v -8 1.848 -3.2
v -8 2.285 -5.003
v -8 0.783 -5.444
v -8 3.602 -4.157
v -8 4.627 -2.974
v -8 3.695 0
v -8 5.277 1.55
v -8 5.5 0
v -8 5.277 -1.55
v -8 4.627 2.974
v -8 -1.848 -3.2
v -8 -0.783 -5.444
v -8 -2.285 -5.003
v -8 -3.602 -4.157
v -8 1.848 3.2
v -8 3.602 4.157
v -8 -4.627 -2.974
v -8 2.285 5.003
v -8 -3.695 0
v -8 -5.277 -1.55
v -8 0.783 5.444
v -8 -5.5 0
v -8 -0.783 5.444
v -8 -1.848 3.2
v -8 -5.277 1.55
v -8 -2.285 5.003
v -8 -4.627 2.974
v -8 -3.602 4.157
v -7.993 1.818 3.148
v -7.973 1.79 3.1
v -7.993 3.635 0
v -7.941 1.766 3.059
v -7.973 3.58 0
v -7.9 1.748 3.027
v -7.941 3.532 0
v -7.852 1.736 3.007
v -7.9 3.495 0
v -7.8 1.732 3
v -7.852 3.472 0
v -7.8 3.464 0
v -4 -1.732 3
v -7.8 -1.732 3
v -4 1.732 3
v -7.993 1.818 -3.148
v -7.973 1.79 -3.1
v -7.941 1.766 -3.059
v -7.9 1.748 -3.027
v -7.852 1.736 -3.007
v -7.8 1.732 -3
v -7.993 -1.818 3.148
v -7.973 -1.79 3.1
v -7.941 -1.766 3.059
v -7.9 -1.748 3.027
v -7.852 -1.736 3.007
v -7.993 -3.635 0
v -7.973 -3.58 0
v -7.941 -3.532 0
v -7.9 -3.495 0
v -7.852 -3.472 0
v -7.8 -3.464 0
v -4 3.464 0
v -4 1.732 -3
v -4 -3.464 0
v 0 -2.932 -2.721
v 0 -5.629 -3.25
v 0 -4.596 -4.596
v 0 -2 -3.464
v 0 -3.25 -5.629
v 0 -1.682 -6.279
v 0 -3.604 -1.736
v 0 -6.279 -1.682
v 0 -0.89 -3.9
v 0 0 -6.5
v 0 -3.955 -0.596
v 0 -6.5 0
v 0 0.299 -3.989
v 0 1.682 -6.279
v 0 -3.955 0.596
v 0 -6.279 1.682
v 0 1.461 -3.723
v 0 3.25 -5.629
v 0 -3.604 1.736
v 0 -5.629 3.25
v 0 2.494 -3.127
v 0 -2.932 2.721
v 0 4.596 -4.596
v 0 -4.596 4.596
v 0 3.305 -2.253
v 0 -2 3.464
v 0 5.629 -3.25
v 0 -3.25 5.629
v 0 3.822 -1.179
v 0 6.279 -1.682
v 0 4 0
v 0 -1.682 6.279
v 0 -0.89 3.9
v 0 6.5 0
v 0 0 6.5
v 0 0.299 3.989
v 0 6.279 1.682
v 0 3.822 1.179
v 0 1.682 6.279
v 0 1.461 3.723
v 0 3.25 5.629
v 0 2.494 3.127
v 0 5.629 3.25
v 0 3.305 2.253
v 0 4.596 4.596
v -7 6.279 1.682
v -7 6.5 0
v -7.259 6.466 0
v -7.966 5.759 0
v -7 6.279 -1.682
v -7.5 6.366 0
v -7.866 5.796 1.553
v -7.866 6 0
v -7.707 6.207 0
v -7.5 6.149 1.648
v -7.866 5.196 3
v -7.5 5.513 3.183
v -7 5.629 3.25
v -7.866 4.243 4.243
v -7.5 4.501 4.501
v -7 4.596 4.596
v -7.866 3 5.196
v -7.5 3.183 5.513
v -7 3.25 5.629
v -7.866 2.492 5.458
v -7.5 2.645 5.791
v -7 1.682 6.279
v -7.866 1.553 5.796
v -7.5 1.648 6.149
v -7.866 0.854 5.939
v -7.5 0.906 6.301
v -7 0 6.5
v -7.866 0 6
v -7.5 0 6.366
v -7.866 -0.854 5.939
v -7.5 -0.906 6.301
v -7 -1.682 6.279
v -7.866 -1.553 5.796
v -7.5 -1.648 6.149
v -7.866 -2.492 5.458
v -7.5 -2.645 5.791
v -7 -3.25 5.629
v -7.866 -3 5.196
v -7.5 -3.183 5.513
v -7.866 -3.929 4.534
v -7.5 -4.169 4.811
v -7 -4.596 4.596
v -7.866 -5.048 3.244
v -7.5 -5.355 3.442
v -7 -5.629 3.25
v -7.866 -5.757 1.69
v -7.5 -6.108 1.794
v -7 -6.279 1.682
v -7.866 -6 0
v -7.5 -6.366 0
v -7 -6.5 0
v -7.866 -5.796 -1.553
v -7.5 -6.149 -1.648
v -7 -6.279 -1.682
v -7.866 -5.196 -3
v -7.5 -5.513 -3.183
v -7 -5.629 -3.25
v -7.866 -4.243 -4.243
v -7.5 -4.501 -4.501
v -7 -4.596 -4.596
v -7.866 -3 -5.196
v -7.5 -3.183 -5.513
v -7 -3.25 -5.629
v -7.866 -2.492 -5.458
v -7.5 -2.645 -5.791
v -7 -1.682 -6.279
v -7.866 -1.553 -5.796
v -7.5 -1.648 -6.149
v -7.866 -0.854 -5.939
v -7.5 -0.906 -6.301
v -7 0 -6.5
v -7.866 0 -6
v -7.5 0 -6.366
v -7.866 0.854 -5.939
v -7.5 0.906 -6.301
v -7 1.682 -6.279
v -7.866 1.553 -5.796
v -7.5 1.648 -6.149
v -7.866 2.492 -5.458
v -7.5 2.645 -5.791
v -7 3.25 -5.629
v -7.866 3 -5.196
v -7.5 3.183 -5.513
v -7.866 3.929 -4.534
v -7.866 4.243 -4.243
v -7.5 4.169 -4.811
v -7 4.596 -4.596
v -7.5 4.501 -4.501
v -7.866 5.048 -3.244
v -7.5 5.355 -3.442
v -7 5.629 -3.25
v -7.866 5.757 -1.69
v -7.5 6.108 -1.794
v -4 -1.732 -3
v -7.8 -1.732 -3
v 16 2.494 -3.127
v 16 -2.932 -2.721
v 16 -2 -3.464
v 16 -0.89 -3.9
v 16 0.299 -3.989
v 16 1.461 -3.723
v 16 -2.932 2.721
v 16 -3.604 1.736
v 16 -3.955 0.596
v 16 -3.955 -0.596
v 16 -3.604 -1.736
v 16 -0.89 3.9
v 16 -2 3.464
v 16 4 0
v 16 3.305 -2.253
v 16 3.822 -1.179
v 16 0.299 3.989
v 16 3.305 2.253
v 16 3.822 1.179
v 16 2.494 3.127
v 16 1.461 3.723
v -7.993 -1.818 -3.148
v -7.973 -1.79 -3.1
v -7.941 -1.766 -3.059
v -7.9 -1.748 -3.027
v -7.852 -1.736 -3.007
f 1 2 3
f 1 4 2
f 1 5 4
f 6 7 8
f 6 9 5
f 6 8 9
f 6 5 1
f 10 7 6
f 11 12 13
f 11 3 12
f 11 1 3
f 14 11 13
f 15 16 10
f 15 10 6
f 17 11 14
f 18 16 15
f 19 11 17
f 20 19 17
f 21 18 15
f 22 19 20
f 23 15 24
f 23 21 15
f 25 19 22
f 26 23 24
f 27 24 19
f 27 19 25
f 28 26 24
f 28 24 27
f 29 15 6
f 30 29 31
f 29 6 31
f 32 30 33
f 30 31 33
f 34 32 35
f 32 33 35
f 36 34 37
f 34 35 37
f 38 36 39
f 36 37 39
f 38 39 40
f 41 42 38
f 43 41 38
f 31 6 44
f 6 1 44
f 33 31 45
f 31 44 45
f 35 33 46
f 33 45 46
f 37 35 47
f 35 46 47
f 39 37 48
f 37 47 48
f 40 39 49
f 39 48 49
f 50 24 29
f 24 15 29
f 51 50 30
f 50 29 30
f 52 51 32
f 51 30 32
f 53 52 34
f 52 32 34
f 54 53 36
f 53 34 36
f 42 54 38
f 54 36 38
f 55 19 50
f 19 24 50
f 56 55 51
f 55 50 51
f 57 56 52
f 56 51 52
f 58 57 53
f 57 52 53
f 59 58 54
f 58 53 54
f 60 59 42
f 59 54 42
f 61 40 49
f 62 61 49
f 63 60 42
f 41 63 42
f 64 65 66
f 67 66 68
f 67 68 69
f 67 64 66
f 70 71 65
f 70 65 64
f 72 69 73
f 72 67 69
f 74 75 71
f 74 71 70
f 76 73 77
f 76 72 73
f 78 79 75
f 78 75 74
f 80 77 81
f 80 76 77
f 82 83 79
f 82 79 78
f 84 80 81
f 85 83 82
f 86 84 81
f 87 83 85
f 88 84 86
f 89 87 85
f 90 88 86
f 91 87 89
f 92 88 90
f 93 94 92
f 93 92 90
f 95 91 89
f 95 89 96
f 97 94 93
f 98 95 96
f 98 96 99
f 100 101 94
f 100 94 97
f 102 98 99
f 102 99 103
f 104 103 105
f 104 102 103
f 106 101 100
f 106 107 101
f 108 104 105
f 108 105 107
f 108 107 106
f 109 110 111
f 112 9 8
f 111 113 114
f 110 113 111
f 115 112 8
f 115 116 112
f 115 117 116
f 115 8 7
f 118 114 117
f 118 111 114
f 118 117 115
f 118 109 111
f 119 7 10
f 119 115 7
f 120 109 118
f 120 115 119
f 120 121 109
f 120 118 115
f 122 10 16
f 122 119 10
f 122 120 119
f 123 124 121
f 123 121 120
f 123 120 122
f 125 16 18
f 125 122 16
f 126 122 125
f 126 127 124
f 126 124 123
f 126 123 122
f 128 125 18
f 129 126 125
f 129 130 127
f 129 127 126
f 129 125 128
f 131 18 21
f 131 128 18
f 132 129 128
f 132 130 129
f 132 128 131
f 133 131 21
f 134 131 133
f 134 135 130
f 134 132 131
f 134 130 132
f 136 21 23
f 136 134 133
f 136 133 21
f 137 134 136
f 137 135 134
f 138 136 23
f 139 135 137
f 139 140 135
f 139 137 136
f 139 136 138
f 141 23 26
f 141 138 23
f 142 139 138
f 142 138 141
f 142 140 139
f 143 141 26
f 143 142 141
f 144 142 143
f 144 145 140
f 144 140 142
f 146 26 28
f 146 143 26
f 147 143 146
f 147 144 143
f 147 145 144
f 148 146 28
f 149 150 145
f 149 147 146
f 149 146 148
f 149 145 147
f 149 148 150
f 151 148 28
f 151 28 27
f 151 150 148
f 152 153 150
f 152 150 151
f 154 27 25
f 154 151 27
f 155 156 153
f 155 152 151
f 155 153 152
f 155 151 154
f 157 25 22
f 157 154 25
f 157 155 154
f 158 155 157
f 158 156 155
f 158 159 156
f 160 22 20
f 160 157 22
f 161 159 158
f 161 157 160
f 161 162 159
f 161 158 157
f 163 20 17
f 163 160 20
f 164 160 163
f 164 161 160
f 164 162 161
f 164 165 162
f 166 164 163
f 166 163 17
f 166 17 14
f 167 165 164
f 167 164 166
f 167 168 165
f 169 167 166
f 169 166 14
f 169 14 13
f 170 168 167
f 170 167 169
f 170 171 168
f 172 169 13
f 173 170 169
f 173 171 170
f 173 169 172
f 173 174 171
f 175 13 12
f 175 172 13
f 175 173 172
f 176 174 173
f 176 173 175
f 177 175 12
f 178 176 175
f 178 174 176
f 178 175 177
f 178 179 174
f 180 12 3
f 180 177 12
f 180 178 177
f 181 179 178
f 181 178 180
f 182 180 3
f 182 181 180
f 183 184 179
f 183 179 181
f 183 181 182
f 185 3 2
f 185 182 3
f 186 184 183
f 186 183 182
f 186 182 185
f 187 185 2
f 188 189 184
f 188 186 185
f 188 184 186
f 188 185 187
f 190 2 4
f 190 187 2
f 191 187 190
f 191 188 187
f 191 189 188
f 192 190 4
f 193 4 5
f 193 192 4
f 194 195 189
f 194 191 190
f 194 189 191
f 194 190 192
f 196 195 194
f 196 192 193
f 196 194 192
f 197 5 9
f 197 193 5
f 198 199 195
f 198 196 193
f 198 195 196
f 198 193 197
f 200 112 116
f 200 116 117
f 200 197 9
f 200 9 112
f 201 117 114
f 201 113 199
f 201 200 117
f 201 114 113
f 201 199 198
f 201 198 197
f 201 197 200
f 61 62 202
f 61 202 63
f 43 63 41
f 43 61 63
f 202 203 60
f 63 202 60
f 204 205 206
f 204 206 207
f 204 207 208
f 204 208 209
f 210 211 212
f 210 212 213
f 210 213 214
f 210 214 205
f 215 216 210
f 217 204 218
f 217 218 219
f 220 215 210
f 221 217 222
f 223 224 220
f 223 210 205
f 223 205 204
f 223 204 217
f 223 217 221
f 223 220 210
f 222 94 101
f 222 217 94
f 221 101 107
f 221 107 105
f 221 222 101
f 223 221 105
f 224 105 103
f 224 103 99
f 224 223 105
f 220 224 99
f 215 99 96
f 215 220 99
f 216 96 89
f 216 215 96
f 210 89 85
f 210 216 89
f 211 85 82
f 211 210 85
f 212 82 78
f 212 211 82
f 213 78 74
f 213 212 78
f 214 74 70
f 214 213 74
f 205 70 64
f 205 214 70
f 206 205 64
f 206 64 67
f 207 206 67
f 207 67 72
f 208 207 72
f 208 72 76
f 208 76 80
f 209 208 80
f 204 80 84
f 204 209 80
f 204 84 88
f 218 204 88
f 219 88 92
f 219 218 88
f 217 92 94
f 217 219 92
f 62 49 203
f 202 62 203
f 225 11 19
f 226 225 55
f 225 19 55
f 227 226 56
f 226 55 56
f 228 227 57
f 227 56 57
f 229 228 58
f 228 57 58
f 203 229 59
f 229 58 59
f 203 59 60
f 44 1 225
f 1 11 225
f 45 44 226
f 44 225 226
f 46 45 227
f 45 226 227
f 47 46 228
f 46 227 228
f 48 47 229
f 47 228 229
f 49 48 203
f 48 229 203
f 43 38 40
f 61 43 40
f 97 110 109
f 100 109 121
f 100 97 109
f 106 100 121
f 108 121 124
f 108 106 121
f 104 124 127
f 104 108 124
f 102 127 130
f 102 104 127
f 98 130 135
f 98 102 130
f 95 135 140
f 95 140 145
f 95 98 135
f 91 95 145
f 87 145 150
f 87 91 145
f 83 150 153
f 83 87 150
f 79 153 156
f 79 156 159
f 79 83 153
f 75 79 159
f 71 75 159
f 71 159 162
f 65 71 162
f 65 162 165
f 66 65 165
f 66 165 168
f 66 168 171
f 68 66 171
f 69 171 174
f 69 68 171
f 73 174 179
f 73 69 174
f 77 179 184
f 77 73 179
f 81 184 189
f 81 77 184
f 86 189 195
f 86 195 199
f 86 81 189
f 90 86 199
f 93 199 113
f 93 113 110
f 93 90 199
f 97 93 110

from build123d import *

# Parameters (mm, degrees)
CUT_EXTRUDE_1_DEPTH = 4
FILLET_1_R          = 1
FILLET_2_R          = 0.2


with BuildPart() as part:
    # Эскиз1 → Повернуть1 (revolve)
    with BuildSketch(Plane.XY):
        Polygon((-8, 0), (-8, 6.5), (0, 6.5), (0, 4), (16, 4), (16, 0), align=None)
    revolve(axis=Axis((-351.589582302, 0, 0), (1, 0, 0)))

    # Эскиз2 → Вырез-Вытянуть1 (cut)
    with BuildSketch(Plane.ZY.offset(8)):
        Polygon((0, -3.464101615), (3, -1.732050808), (3, 1.732050808), (0, 3.464101615), (-3, 1.732050808), (-3, -1.732050808), align=None)
    extrude(amount=-CUT_EXTRUDE_1_DEPTH, mode=Mode.SUBTRACT)

    # Скругление1
    fillet_1_edges = [part.edges().sort_by_distance(p)[0] for p in [
        (-8, -6.5, 0),
    ]]
    fillet(fillet_1_edges, radius=FILLET_1_R)

    # Скругление2
    fillet_2_edges = [part.edges().sort_by_distance(p)[0] for p in [
        (-8, -2.598076211, -1.5),
        (-8, -2.598076211, 1.5),
        (-8, 0, 3),
        (-8, 2.598076211, 1.5),
        (-8, 2.598076211, -1.5),
        (-8, 0, -3),
    ]]
    fillet(fillet_2_edges, radius=FILLET_2_R)


solid = part.part
